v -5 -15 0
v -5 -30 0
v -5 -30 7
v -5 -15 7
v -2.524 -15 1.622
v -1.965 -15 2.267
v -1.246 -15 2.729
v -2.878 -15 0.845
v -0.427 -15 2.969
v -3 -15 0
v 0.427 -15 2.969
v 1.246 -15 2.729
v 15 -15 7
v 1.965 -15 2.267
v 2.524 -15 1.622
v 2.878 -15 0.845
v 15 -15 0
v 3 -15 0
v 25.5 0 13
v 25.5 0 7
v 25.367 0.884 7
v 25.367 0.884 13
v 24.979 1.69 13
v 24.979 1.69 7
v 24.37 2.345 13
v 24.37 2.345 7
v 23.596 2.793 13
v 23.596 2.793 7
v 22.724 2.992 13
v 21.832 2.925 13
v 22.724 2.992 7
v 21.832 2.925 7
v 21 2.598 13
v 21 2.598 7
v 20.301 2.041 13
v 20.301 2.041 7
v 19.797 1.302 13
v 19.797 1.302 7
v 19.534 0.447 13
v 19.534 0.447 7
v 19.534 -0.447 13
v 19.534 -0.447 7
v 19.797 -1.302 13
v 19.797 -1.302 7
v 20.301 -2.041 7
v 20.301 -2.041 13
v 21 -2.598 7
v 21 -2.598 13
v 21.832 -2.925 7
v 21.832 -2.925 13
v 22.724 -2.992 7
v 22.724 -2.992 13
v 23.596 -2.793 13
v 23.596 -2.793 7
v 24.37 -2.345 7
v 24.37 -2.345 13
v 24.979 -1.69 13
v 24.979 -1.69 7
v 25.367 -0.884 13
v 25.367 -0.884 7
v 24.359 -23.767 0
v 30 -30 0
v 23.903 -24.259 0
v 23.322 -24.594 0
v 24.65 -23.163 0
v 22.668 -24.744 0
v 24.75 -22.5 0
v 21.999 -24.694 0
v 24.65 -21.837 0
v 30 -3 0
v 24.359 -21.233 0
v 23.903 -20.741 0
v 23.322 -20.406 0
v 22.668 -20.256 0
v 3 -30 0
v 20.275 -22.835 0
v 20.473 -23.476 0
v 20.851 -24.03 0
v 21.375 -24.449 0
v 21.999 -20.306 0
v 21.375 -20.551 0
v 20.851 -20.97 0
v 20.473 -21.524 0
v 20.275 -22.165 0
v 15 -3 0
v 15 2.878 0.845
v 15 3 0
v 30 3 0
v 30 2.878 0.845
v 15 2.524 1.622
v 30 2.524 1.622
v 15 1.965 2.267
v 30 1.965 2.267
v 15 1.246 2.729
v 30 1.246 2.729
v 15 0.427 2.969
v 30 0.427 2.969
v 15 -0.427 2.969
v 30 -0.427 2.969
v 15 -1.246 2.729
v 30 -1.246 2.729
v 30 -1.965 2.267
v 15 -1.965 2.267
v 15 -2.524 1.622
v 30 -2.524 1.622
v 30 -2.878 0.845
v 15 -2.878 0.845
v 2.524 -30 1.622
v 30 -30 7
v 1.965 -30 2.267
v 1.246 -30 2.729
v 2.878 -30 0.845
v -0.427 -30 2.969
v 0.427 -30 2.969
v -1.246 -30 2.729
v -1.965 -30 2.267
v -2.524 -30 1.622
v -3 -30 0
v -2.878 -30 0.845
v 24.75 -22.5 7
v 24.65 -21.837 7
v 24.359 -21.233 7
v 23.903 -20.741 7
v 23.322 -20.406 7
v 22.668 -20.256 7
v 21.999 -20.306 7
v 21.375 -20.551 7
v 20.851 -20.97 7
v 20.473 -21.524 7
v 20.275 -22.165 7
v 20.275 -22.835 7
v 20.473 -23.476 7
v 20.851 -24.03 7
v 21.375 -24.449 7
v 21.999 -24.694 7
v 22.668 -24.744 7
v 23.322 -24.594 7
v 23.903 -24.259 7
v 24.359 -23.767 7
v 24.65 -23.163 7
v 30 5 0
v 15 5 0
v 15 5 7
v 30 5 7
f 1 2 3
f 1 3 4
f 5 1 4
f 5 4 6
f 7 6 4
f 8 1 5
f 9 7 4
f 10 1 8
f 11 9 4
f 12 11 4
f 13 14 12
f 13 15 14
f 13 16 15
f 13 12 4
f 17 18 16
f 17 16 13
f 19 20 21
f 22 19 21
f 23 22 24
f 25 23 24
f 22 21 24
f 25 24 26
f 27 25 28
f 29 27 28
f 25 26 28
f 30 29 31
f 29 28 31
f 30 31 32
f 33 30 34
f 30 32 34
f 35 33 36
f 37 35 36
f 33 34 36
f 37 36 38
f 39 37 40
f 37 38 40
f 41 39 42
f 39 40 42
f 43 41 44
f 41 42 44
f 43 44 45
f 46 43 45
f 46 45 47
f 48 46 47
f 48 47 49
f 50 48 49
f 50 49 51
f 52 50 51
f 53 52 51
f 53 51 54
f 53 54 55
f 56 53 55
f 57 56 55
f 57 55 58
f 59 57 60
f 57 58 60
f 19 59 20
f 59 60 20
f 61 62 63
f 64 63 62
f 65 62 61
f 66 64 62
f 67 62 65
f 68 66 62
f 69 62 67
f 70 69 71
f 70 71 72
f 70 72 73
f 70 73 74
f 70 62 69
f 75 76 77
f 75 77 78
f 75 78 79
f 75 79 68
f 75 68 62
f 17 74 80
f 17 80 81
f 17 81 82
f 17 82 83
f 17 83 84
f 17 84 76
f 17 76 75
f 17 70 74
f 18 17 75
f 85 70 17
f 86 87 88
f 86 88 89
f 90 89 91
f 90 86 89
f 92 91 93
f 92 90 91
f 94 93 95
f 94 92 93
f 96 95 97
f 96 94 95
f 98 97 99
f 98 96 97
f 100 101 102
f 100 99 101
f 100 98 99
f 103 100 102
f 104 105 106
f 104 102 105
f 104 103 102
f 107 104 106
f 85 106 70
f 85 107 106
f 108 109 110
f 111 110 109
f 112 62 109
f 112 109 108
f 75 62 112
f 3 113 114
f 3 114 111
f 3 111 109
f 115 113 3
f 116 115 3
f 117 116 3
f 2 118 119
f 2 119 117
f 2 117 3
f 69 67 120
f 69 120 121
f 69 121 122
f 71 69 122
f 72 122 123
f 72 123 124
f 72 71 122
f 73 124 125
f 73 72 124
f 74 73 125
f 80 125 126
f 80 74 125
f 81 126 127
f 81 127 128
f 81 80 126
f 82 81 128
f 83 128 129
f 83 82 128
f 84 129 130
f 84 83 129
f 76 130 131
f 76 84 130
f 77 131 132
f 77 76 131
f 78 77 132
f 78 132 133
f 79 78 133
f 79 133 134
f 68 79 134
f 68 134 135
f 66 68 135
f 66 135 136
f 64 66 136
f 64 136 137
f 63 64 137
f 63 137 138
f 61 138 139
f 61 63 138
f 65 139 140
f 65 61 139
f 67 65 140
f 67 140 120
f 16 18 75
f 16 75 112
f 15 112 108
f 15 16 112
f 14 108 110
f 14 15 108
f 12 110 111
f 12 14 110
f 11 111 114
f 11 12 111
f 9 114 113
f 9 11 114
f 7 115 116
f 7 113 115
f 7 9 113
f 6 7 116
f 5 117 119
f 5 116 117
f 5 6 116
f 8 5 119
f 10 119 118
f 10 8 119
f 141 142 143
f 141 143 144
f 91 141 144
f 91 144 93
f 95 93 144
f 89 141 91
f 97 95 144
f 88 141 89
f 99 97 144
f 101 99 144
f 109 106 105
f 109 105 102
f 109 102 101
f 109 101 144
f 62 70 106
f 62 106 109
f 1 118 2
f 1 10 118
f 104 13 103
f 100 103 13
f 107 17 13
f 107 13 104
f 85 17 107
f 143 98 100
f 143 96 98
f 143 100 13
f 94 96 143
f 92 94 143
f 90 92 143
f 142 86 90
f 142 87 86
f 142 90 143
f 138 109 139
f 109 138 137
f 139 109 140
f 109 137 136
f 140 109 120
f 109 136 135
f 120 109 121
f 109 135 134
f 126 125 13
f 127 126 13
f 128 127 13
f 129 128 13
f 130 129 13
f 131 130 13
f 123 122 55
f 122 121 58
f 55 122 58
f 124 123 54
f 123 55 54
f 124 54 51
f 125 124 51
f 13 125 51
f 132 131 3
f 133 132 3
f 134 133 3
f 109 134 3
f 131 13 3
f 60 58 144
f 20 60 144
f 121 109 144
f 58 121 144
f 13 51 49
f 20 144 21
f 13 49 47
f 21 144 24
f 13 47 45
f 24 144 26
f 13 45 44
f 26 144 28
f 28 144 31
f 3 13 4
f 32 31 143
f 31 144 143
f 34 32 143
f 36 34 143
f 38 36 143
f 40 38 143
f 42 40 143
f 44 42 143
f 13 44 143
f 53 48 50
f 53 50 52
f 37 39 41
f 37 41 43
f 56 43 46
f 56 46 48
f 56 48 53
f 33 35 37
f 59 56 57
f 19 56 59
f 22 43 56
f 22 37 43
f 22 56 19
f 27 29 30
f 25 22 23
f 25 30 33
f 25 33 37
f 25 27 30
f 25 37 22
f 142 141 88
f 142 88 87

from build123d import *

# Parameters (mm, degrees)
SKETCH008_R     = 2.25
PAD005_DEPTH    = 7
SKETCH009_R     = 3
POCKET003_DEPTH = 30.001
SKETCH010_R     = 3
POCKET004_DEPTH = 30.001
SKETCH011_R     = 3
PAD006_DEPTH    = 6


with BuildPart() as part:
    # Sketch008 → Pad005 (new body)
    with BuildSketch(Plane.XY):
        Polygon((-5, -30), (-5, -15), (15, -15), (15, 5), (30, 5), (30, -30), align=None)
        with Locations((22.5, -22.5)):
            Circle(SKETCH008_R, mode=Mode.SUBTRACT)
    extrude(amount=PAD005_DEPTH)

    # Sketch009 → Pocket003 (cut, through all)
    with BuildSketch(Plane.XZ):
        Circle(SKETCH009_R)
    extrude(amount=POCKET003_DEPTH, mode=Mode.SUBTRACT)

    # Sketch010 → Pocket004 (cut, through all)
    with BuildSketch(Plane.YZ):
        Circle(SKETCH010_R)
    extrude(amount=POCKET004_DEPTH, mode=Mode.SUBTRACT)

    # Sketch011 → Pad006 (join)
    with BuildSketch(Plane.XY.offset(7)):
        with Locations((22.5, 0)):
            Circle(SKETCH011_R)
    extrude(amount=PAD006_DEPTH)


solid = part.part
